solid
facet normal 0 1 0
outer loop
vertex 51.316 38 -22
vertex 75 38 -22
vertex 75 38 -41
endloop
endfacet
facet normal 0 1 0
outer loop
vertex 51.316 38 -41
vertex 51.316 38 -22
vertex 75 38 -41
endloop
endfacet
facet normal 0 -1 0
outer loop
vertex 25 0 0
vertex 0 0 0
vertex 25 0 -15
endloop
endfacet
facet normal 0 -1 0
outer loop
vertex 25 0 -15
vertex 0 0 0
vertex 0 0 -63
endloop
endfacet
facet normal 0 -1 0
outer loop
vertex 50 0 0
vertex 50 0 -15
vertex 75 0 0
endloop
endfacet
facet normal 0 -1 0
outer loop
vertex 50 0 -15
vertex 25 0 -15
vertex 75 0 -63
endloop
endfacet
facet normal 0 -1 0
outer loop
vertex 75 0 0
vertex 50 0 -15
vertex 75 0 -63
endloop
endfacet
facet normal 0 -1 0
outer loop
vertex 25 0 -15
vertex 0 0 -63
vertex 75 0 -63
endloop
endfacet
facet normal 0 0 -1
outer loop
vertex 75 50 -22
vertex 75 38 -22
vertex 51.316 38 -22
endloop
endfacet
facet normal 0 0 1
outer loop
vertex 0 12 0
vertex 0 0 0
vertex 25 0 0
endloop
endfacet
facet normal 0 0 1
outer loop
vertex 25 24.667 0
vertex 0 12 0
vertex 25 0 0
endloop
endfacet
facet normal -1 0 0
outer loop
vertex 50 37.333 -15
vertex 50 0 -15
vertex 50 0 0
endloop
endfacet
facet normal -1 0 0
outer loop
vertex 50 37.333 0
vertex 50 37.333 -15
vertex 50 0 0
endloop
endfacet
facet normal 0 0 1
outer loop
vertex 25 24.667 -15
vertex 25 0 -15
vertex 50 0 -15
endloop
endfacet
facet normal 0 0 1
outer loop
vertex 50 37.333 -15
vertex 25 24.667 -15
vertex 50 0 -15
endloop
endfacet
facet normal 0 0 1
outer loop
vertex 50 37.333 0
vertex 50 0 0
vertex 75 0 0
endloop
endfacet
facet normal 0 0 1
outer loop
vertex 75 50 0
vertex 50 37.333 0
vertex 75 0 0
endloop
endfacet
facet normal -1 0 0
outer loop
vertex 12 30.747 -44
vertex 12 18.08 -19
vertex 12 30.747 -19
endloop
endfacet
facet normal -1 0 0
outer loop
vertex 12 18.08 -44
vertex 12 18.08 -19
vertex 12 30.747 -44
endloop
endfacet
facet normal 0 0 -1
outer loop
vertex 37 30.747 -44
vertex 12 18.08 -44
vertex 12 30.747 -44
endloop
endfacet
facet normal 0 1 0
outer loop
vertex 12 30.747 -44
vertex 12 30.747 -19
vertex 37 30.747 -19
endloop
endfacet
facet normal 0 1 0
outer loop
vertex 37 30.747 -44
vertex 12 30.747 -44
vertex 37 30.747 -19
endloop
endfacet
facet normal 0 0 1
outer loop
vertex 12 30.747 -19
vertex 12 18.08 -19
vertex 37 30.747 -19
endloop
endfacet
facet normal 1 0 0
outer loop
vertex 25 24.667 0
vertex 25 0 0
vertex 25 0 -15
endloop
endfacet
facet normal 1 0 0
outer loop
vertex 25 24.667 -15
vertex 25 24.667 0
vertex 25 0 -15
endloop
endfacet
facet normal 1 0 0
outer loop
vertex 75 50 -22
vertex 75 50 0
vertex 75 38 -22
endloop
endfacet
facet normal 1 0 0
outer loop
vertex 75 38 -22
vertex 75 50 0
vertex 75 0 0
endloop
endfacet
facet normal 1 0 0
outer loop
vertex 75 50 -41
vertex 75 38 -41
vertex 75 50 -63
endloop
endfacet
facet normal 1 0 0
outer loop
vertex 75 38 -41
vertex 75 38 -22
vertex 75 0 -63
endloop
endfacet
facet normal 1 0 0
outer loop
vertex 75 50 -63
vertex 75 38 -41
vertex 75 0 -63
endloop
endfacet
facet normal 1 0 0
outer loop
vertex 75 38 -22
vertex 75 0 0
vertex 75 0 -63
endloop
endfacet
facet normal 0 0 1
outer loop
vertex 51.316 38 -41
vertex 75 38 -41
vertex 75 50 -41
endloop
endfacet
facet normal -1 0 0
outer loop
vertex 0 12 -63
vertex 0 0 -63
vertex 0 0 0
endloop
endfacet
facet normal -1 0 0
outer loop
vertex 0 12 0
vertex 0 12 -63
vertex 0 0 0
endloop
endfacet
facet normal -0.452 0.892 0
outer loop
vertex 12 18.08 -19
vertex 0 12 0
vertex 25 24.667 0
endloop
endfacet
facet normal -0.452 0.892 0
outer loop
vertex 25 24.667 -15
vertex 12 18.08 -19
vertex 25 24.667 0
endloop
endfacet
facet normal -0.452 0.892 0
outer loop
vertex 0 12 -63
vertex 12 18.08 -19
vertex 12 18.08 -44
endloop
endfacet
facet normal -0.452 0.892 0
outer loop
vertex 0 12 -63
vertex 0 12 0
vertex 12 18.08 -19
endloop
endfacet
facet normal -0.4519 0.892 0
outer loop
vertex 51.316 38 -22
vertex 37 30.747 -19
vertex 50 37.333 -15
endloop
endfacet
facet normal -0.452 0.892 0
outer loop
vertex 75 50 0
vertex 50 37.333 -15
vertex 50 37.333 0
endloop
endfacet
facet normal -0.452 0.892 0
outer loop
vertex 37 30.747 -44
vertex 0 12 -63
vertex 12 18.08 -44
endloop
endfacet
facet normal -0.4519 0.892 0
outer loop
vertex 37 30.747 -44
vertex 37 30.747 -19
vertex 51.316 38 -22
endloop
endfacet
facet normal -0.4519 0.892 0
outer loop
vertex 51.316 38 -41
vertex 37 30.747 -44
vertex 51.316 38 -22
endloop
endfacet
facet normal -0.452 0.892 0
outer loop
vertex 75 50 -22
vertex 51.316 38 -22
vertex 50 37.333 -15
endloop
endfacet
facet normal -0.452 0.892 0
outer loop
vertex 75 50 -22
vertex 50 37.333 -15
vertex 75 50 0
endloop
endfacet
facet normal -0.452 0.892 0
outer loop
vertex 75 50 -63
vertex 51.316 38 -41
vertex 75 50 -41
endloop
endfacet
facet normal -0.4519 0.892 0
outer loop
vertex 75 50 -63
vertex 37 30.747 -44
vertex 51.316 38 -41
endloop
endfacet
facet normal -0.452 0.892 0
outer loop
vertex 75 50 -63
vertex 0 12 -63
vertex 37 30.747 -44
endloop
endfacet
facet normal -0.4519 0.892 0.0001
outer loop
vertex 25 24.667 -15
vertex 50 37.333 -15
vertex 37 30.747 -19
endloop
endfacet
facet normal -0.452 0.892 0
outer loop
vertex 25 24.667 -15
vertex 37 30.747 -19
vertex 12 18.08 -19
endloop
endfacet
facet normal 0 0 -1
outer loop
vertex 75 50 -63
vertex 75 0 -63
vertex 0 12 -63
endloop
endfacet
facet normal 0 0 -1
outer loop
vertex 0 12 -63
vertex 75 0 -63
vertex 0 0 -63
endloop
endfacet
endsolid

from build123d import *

# Parameters (mm, degrees)
SKETCH1_W           = 25
SKETCH1_H           = 25
BOSS_EXTRUDE1_DEPTH = 50
CUT_EXTRUDE2_REACH  = 111.973
CUT_EXTRUDE3_REACH  = 111.973
SKETCH3_W           = 19
SKETCH3_H           = 12
SKETCH1_3_W         = 25
SKETCH1_3_H         = 25
BOSS_EXTRUDE2_DEPTH = 31
CUT_EXTRUDE4_REACH  = 102.305
SKETCH4_W           = 25
SKETCH4_H           = 0.253333333


with BuildPart() as part:
    # Sketch1 → Boss-Extrude1 (new body)
    with BuildSketch(Plane(origin=(0, 0, 0), x_dir=(1, 0, 0), z_dir=(0, 1, 0))):
        Polygon((0, 0), (25, 0), (25, 15), (50, 15), (50, 0), (75, 0), (75, 63), (0, 63), align=None)
        with Locations((24.5, 31.5)):
            Rectangle(SKETCH1_W, SKETCH1_H, mode=Mode.SUBTRACT)
    extrude(amount=BOSS_EXTRUDE1_DEPTH)

    # Sketch2 → Cut-Extrude2 (cut, up to next)
    with BuildSketch(Plane(origin=(0, 0, -63), x_dir=(-1, 0, 0), z_dir=(0, 0, -1)), mode=Mode.PRIVATE) as cut_extrude2_sk1:
        Polygon((0, 12), (-75, 50), (0, 50), align=None)
    cut_extrude2_tool1 = extrude(cut_extrude2_sk1.sketch, amount=-CUT_EXTRUDE2_REACH, mode=Mode.PRIVATE) & part.part
    add(cut_extrude2_tool1.solids().sort_by_distance((25, 37.333333, -63))[0], mode=Mode.SUBTRACT)

    # Sketch3 → Cut-Extrude3 (cut, up to next)
    with BuildSketch(Plane(origin=(75, 0, 0), x_dir=(0, 0, -1), z_dir=(1, 0, 0)), mode=Mode.PRIVATE) as cut_extrude3_sk1:
        with Locations((31.5, 44)):
            Rectangle(SKETCH3_W, SKETCH3_H)
    cut_extrude3_tool1 = extrude(cut_extrude3_sk1.sketch, amount=-CUT_EXTRUDE3_REACH, mode=Mode.PRIVATE) & part.part
    add(cut_extrude3_tool1.solids().sort_by_distance((75, 44, -31.5))[0], mode=Mode.SUBTRACT)

    # Sketch1<3> → Boss-Extrude2 (add)
    with BuildSketch(Plane(origin=(0, 0, 0), x_dir=(1, 0, 0), z_dir=(0, 1, 0))):
        with Locations((24.5, 31.5)):
            Rectangle(SKETCH1_3_W, SKETCH1_3_H)
    extrude(amount=BOSS_EXTRUDE2_DEPTH)

    # Sketch4 → Cut-Extrude4 (cut, up to next)
    with BuildSketch(Plane.XY.offset(-19), mode=Mode.PRIVATE) as cut_extrude4_sk1:
        with Locations((24.5, 30.873333334)):
            Rectangle(SKETCH4_W, SKETCH4_H)
    cut_extrude4_tool1 = extrude(cut_extrude4_sk1.sketch, amount=-CUT_EXTRUDE4_REACH, mode=Mode.PRIVATE) & part.part
    add(cut_extrude4_tool1.solids().sort_by_distance((24.5, 30.873333, -19))[0], mode=Mode.SUBTRACT)


solid = part.part
